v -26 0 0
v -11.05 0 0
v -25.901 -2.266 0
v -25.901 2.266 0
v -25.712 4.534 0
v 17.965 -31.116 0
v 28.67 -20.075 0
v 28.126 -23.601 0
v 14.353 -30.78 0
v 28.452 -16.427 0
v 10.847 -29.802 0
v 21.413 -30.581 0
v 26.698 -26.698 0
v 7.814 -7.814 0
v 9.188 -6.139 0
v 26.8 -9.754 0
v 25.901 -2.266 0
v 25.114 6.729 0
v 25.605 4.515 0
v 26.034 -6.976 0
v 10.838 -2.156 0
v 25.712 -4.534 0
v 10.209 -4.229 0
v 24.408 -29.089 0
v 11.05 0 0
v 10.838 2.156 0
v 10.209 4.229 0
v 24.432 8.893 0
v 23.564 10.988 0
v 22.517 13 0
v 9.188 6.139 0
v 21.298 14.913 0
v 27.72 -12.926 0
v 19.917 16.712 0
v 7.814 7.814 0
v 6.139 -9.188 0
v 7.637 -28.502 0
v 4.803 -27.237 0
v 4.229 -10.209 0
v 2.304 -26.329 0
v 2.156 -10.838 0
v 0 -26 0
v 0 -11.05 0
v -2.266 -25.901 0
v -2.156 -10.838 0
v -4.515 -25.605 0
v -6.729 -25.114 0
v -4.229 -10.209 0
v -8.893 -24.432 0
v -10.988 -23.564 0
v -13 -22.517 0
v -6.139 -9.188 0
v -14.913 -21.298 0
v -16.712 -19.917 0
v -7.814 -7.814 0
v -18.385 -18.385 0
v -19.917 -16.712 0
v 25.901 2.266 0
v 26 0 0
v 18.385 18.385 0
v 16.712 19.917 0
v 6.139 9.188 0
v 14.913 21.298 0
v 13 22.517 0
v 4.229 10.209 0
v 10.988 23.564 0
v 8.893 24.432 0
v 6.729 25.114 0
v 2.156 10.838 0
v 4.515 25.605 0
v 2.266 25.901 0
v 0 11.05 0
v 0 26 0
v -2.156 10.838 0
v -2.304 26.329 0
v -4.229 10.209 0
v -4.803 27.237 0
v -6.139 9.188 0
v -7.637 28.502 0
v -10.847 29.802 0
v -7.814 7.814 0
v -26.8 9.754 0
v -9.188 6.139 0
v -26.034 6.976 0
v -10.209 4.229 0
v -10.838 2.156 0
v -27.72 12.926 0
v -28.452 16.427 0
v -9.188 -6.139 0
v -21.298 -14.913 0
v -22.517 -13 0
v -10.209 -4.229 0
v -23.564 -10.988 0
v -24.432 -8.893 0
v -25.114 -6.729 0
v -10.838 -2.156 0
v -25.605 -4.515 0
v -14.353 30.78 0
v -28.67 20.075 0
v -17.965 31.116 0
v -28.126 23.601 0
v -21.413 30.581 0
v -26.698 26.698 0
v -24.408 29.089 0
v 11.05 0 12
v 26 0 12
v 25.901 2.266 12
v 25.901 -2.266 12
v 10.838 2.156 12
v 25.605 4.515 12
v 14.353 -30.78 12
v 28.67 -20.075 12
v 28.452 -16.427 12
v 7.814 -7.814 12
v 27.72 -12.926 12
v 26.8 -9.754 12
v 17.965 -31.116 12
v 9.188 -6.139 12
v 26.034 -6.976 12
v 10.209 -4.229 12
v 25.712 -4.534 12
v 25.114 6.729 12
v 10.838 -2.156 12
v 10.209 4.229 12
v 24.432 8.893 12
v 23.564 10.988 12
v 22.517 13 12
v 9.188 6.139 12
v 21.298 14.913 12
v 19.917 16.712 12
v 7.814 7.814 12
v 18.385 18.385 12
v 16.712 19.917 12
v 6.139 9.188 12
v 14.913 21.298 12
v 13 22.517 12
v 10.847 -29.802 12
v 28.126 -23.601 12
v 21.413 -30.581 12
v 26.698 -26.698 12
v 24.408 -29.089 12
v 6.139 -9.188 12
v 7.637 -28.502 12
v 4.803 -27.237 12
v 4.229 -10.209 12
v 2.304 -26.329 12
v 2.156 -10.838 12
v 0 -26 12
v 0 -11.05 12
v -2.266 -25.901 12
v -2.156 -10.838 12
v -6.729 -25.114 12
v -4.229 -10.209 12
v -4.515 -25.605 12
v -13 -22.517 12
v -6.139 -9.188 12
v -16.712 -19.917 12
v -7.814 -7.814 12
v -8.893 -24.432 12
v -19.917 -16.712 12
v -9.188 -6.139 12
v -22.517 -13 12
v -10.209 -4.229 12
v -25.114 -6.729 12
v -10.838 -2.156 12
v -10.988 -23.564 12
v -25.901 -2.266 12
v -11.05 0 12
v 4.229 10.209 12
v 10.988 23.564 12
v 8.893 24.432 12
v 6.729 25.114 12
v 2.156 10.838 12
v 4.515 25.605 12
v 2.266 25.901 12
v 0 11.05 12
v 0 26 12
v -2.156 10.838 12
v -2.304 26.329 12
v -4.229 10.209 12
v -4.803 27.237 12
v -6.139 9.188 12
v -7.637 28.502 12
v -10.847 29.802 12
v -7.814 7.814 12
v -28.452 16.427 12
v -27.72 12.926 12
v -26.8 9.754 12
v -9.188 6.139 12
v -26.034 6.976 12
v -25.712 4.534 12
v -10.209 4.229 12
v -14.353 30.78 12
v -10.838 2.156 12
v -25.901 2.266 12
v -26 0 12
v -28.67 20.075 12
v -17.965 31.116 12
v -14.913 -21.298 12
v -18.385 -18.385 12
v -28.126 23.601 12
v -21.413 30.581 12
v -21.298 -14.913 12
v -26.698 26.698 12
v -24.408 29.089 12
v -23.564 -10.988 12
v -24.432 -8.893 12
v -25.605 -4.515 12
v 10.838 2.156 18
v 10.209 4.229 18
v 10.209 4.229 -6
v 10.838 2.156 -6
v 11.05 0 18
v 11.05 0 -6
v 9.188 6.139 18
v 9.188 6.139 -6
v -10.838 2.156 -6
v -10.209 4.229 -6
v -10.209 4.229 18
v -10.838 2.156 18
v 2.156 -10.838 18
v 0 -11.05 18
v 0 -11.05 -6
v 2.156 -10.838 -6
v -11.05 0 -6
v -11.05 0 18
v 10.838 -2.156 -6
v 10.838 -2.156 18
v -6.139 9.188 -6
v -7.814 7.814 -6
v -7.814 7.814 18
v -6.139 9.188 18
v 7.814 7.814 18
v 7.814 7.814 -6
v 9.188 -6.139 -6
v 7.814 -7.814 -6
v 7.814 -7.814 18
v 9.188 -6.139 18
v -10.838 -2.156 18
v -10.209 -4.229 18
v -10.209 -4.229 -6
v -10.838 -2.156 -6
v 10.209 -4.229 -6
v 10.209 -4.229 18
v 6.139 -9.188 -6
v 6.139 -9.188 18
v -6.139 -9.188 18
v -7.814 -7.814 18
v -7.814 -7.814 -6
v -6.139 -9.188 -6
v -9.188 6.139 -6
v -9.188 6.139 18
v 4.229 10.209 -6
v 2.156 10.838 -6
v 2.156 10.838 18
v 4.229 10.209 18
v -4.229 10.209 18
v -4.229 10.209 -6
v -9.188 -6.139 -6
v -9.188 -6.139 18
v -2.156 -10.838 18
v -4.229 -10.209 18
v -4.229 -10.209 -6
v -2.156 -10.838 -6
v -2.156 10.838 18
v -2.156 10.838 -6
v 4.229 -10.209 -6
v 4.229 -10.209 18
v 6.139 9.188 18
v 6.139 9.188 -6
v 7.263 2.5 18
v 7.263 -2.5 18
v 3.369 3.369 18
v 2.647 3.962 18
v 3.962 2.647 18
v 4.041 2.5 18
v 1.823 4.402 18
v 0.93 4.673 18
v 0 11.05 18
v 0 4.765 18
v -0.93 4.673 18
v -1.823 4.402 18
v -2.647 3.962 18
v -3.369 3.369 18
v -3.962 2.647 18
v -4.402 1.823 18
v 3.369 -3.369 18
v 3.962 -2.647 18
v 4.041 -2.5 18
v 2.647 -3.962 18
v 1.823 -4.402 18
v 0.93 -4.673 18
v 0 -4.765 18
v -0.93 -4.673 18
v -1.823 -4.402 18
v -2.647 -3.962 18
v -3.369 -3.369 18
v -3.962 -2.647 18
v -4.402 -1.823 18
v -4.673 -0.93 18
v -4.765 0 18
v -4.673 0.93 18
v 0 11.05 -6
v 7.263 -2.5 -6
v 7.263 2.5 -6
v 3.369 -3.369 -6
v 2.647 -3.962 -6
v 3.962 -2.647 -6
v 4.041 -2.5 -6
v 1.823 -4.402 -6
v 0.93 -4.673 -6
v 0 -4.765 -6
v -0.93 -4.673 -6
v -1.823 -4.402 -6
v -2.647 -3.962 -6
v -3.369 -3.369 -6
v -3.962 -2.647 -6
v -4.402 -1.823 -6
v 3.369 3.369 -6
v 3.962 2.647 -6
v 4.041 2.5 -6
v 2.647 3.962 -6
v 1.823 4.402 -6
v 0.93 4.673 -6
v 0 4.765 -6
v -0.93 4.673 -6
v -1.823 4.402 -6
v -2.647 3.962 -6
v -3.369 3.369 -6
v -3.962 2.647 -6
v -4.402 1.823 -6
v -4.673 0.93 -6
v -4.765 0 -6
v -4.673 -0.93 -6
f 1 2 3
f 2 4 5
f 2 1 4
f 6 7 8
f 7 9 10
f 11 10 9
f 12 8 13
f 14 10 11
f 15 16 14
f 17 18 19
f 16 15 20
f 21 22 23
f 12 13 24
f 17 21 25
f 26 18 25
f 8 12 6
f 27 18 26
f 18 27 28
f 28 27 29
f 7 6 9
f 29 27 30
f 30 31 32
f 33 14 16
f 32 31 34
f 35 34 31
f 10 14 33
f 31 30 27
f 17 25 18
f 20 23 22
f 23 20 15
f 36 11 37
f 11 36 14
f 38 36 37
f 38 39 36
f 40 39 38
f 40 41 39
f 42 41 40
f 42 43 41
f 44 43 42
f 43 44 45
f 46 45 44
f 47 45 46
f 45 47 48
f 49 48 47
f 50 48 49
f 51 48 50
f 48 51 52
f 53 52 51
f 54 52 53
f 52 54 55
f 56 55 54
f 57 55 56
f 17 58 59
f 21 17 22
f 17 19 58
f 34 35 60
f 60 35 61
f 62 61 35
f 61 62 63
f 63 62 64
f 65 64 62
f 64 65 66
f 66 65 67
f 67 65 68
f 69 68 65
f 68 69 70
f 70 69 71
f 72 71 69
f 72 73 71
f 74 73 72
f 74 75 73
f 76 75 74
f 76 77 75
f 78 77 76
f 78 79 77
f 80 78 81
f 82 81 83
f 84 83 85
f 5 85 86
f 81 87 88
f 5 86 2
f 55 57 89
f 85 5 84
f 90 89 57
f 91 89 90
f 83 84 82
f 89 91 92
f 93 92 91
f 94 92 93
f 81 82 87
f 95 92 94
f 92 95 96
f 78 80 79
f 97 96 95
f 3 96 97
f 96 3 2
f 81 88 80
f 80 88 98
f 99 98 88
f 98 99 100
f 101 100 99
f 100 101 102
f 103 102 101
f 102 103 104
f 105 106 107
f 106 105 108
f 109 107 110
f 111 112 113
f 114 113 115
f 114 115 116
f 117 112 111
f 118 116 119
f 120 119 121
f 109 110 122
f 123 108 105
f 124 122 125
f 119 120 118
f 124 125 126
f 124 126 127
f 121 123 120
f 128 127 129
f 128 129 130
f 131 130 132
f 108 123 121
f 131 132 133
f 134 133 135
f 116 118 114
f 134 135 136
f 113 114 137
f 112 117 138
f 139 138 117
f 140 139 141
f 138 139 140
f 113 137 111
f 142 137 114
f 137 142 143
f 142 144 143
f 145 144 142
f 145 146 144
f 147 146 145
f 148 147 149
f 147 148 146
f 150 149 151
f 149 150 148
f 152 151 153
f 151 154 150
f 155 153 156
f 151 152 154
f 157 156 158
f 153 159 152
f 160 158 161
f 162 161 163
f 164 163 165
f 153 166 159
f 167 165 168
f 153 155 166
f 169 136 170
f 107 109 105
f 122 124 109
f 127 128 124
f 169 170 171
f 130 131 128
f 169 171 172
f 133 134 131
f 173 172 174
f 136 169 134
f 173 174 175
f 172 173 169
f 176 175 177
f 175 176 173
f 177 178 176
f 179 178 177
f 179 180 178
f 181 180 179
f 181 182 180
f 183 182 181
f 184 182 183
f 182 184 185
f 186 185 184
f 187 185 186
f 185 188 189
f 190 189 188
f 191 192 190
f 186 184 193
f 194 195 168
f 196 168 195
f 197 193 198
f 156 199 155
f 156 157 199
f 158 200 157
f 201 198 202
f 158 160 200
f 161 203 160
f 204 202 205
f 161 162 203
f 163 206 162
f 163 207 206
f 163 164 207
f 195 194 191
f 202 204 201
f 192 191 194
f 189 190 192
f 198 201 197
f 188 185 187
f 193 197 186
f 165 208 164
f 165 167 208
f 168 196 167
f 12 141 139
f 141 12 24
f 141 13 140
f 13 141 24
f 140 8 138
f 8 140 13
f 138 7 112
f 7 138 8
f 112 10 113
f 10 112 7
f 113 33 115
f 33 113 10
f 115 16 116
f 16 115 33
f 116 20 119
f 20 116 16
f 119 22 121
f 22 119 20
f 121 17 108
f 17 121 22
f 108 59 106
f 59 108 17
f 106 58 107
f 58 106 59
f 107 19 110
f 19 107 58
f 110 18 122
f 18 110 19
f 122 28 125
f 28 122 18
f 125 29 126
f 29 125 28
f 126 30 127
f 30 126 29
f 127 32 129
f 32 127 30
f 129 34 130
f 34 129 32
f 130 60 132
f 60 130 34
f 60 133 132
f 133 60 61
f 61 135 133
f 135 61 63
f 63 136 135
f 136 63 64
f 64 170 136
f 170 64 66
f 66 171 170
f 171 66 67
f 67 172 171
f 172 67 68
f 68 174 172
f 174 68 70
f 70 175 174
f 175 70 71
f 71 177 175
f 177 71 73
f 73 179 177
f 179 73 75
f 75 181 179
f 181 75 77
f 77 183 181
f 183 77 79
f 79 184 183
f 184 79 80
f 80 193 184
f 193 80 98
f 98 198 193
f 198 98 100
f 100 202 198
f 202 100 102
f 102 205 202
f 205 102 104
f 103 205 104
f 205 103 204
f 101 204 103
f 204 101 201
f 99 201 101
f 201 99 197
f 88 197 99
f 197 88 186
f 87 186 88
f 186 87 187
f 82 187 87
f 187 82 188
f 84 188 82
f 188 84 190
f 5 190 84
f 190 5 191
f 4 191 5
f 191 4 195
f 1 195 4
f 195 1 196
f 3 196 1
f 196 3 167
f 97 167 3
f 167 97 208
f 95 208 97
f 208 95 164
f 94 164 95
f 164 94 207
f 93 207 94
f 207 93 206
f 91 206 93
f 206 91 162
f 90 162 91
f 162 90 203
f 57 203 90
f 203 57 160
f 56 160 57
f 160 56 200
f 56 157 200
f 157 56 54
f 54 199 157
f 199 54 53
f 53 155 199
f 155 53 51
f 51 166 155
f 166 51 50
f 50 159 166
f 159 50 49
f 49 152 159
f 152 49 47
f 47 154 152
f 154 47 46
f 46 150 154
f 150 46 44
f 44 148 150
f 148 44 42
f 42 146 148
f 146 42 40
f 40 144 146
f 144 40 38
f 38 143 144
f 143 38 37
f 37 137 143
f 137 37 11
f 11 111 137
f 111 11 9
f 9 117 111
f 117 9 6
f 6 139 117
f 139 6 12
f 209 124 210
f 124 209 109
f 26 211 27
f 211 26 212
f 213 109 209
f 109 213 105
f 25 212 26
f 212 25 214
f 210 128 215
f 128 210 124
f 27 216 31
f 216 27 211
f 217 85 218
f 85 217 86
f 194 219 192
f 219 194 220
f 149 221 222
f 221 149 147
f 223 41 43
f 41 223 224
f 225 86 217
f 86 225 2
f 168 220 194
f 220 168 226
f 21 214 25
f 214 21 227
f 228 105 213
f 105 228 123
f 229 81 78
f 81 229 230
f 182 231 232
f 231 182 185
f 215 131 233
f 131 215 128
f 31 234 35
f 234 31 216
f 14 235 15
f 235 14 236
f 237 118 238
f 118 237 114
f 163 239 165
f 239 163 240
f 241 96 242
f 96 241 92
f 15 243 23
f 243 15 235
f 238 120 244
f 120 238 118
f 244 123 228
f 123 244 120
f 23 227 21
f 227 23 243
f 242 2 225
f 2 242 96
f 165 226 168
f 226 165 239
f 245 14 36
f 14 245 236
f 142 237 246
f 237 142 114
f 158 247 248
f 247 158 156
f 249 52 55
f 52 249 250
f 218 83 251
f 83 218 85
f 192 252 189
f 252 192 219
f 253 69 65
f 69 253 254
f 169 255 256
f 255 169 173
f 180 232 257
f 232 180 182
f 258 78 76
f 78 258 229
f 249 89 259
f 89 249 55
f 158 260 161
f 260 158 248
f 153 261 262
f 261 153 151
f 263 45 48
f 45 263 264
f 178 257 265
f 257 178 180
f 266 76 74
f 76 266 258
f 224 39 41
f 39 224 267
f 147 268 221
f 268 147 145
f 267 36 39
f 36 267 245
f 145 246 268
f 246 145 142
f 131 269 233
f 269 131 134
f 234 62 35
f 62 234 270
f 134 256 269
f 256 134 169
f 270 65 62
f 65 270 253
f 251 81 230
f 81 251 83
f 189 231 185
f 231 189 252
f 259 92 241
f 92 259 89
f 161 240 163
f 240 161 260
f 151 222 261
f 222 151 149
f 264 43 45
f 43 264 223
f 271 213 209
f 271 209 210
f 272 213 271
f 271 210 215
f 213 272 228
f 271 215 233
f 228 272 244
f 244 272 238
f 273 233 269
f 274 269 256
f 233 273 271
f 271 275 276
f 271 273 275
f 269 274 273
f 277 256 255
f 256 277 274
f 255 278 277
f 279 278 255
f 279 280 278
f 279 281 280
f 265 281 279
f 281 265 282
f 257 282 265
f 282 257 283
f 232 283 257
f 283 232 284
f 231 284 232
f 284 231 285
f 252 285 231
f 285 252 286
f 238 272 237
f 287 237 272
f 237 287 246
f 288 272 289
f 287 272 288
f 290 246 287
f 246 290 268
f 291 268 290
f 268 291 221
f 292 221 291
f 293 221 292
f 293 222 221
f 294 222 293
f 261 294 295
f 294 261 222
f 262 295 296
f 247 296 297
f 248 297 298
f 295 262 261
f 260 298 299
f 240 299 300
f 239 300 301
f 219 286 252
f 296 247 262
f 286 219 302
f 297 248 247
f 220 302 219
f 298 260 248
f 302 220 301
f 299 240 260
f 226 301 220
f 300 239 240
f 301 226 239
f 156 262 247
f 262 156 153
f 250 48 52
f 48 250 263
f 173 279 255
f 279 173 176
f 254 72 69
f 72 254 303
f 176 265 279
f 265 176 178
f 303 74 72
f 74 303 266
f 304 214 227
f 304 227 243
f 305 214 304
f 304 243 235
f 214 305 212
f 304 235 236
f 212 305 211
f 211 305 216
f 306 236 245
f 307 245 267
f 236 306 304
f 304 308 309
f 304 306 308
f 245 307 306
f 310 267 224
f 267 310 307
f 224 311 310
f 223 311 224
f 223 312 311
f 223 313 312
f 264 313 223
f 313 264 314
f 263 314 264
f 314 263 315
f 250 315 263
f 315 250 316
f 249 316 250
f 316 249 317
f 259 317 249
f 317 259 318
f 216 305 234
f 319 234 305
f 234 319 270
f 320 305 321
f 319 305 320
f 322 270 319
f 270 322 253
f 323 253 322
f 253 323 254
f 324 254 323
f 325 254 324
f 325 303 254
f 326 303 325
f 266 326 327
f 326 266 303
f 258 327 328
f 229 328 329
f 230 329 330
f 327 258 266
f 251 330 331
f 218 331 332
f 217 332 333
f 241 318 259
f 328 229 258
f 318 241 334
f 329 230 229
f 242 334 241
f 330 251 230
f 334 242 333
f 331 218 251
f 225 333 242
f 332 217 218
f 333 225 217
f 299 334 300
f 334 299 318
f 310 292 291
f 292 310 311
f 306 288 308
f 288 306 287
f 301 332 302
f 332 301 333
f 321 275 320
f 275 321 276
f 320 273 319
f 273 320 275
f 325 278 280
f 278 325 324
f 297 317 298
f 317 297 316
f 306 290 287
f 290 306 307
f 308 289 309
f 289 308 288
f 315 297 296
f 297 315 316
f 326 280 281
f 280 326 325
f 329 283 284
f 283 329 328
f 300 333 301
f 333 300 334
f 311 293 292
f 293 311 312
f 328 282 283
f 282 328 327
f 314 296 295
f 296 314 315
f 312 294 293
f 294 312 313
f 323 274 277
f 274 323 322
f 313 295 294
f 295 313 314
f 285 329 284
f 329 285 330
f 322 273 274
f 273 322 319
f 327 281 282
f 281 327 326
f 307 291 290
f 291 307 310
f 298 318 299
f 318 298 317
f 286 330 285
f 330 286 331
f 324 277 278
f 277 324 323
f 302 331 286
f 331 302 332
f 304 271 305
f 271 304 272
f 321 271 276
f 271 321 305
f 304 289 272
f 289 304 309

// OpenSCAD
$fn = 32;

// ----------------------------------------------------------------------
// Cam: base radius 26 mm with a 12 mm lift over 150 degrees
// ----------------------------------------------------------------------

// --- parameters (mm) ---
base_r = 26;              // base radius
lift = 12;                // lift height above the base radius
lift_span = 150;          // angular width of the lift
lift_start = 90;          // angle where the lift starts
cam_t = 12;               // cam plate thickness
hub_d = 22.1;             // hub diameter
hub_h = 24;               // hub height
bore_d = 9.53;            // bore
key_w = 5;                // keyway width
key_depth = 2.5;          // keyway depth

cam_profile = [[26, 0], [25.901, 2.266], [25.605, 4.515], [25.114, 6.729], [24.432, 8.893], [23.564, 10.988], [22.517, 13], [21.298, 14.913], [19.917, 16.712], [18.385, 18.385], [16.712, 19.917], [14.913, 21.298], [13, 22.517], [10.988, 23.564], [8.893, 24.432], [6.729, 25.114], [4.515, 25.605], [2.266, 25.901], [0, 26], [-2.304, 26.329], [-4.803, 27.237], [-7.637, 28.502], [-10.847, 29.802], [-14.353, 30.78], [-17.965, 31.116], [-21.413, 30.581], [-24.408, 29.089], [-26.698, 26.698], [-28.126, 23.601], [-28.67, 20.075], [-28.452, 16.427], [-27.72, 12.926], [-26.8, 9.754], [-26.034, 6.976], [-25.712, 4.534], [-25.901, 2.266], [-26, 0], [-25.901, -2.266], [-25.605, -4.515], [-25.114, -6.729], [-24.432, -8.893], [-23.564, -10.988], [-22.517, -13], [-21.298, -14.913], [-19.917, -16.712], [-18.385, -18.385], [-16.712, -19.917], [-14.913, -21.298], [-13, -22.517], [-10.988, -23.564], [-8.893, -24.432], [-6.729, -25.114], [-4.515, -25.605], [-2.266, -25.901], [0, -26], [2.304, -26.329], [4.803, -27.237], [7.637, -28.502], [10.847, -29.802], [14.353, -30.78], [17.965, -31.116], [21.413, -30.581], [24.408, -29.089], [26.698, -26.698], [28.126, -23.601], [28.67, -20.075], [28.452, -16.427], [27.72, -12.926], [26.8, -9.754], [26.034, -6.976], [25.712, -4.534], [25.901, -2.266]];

difference() {
  union() {
    linear_extrude(height = cam_t) polygon(cam_profile);
    /* hub, proud of the cam plate on both sides */
    translate([0, 0, -6]) cylinder(h = hub_h, d = hub_d);
  }
  /* bore through the hub, 2.5 mm clear on both faces */
  translate([0, 0, -8.5]) cylinder(h = hub_h + 5, d = bore_d);
  /* keyway, milled through the whole hub */
  translate([2.263, -2.5, -8.5]) cube([5, 5, 29]);
}
